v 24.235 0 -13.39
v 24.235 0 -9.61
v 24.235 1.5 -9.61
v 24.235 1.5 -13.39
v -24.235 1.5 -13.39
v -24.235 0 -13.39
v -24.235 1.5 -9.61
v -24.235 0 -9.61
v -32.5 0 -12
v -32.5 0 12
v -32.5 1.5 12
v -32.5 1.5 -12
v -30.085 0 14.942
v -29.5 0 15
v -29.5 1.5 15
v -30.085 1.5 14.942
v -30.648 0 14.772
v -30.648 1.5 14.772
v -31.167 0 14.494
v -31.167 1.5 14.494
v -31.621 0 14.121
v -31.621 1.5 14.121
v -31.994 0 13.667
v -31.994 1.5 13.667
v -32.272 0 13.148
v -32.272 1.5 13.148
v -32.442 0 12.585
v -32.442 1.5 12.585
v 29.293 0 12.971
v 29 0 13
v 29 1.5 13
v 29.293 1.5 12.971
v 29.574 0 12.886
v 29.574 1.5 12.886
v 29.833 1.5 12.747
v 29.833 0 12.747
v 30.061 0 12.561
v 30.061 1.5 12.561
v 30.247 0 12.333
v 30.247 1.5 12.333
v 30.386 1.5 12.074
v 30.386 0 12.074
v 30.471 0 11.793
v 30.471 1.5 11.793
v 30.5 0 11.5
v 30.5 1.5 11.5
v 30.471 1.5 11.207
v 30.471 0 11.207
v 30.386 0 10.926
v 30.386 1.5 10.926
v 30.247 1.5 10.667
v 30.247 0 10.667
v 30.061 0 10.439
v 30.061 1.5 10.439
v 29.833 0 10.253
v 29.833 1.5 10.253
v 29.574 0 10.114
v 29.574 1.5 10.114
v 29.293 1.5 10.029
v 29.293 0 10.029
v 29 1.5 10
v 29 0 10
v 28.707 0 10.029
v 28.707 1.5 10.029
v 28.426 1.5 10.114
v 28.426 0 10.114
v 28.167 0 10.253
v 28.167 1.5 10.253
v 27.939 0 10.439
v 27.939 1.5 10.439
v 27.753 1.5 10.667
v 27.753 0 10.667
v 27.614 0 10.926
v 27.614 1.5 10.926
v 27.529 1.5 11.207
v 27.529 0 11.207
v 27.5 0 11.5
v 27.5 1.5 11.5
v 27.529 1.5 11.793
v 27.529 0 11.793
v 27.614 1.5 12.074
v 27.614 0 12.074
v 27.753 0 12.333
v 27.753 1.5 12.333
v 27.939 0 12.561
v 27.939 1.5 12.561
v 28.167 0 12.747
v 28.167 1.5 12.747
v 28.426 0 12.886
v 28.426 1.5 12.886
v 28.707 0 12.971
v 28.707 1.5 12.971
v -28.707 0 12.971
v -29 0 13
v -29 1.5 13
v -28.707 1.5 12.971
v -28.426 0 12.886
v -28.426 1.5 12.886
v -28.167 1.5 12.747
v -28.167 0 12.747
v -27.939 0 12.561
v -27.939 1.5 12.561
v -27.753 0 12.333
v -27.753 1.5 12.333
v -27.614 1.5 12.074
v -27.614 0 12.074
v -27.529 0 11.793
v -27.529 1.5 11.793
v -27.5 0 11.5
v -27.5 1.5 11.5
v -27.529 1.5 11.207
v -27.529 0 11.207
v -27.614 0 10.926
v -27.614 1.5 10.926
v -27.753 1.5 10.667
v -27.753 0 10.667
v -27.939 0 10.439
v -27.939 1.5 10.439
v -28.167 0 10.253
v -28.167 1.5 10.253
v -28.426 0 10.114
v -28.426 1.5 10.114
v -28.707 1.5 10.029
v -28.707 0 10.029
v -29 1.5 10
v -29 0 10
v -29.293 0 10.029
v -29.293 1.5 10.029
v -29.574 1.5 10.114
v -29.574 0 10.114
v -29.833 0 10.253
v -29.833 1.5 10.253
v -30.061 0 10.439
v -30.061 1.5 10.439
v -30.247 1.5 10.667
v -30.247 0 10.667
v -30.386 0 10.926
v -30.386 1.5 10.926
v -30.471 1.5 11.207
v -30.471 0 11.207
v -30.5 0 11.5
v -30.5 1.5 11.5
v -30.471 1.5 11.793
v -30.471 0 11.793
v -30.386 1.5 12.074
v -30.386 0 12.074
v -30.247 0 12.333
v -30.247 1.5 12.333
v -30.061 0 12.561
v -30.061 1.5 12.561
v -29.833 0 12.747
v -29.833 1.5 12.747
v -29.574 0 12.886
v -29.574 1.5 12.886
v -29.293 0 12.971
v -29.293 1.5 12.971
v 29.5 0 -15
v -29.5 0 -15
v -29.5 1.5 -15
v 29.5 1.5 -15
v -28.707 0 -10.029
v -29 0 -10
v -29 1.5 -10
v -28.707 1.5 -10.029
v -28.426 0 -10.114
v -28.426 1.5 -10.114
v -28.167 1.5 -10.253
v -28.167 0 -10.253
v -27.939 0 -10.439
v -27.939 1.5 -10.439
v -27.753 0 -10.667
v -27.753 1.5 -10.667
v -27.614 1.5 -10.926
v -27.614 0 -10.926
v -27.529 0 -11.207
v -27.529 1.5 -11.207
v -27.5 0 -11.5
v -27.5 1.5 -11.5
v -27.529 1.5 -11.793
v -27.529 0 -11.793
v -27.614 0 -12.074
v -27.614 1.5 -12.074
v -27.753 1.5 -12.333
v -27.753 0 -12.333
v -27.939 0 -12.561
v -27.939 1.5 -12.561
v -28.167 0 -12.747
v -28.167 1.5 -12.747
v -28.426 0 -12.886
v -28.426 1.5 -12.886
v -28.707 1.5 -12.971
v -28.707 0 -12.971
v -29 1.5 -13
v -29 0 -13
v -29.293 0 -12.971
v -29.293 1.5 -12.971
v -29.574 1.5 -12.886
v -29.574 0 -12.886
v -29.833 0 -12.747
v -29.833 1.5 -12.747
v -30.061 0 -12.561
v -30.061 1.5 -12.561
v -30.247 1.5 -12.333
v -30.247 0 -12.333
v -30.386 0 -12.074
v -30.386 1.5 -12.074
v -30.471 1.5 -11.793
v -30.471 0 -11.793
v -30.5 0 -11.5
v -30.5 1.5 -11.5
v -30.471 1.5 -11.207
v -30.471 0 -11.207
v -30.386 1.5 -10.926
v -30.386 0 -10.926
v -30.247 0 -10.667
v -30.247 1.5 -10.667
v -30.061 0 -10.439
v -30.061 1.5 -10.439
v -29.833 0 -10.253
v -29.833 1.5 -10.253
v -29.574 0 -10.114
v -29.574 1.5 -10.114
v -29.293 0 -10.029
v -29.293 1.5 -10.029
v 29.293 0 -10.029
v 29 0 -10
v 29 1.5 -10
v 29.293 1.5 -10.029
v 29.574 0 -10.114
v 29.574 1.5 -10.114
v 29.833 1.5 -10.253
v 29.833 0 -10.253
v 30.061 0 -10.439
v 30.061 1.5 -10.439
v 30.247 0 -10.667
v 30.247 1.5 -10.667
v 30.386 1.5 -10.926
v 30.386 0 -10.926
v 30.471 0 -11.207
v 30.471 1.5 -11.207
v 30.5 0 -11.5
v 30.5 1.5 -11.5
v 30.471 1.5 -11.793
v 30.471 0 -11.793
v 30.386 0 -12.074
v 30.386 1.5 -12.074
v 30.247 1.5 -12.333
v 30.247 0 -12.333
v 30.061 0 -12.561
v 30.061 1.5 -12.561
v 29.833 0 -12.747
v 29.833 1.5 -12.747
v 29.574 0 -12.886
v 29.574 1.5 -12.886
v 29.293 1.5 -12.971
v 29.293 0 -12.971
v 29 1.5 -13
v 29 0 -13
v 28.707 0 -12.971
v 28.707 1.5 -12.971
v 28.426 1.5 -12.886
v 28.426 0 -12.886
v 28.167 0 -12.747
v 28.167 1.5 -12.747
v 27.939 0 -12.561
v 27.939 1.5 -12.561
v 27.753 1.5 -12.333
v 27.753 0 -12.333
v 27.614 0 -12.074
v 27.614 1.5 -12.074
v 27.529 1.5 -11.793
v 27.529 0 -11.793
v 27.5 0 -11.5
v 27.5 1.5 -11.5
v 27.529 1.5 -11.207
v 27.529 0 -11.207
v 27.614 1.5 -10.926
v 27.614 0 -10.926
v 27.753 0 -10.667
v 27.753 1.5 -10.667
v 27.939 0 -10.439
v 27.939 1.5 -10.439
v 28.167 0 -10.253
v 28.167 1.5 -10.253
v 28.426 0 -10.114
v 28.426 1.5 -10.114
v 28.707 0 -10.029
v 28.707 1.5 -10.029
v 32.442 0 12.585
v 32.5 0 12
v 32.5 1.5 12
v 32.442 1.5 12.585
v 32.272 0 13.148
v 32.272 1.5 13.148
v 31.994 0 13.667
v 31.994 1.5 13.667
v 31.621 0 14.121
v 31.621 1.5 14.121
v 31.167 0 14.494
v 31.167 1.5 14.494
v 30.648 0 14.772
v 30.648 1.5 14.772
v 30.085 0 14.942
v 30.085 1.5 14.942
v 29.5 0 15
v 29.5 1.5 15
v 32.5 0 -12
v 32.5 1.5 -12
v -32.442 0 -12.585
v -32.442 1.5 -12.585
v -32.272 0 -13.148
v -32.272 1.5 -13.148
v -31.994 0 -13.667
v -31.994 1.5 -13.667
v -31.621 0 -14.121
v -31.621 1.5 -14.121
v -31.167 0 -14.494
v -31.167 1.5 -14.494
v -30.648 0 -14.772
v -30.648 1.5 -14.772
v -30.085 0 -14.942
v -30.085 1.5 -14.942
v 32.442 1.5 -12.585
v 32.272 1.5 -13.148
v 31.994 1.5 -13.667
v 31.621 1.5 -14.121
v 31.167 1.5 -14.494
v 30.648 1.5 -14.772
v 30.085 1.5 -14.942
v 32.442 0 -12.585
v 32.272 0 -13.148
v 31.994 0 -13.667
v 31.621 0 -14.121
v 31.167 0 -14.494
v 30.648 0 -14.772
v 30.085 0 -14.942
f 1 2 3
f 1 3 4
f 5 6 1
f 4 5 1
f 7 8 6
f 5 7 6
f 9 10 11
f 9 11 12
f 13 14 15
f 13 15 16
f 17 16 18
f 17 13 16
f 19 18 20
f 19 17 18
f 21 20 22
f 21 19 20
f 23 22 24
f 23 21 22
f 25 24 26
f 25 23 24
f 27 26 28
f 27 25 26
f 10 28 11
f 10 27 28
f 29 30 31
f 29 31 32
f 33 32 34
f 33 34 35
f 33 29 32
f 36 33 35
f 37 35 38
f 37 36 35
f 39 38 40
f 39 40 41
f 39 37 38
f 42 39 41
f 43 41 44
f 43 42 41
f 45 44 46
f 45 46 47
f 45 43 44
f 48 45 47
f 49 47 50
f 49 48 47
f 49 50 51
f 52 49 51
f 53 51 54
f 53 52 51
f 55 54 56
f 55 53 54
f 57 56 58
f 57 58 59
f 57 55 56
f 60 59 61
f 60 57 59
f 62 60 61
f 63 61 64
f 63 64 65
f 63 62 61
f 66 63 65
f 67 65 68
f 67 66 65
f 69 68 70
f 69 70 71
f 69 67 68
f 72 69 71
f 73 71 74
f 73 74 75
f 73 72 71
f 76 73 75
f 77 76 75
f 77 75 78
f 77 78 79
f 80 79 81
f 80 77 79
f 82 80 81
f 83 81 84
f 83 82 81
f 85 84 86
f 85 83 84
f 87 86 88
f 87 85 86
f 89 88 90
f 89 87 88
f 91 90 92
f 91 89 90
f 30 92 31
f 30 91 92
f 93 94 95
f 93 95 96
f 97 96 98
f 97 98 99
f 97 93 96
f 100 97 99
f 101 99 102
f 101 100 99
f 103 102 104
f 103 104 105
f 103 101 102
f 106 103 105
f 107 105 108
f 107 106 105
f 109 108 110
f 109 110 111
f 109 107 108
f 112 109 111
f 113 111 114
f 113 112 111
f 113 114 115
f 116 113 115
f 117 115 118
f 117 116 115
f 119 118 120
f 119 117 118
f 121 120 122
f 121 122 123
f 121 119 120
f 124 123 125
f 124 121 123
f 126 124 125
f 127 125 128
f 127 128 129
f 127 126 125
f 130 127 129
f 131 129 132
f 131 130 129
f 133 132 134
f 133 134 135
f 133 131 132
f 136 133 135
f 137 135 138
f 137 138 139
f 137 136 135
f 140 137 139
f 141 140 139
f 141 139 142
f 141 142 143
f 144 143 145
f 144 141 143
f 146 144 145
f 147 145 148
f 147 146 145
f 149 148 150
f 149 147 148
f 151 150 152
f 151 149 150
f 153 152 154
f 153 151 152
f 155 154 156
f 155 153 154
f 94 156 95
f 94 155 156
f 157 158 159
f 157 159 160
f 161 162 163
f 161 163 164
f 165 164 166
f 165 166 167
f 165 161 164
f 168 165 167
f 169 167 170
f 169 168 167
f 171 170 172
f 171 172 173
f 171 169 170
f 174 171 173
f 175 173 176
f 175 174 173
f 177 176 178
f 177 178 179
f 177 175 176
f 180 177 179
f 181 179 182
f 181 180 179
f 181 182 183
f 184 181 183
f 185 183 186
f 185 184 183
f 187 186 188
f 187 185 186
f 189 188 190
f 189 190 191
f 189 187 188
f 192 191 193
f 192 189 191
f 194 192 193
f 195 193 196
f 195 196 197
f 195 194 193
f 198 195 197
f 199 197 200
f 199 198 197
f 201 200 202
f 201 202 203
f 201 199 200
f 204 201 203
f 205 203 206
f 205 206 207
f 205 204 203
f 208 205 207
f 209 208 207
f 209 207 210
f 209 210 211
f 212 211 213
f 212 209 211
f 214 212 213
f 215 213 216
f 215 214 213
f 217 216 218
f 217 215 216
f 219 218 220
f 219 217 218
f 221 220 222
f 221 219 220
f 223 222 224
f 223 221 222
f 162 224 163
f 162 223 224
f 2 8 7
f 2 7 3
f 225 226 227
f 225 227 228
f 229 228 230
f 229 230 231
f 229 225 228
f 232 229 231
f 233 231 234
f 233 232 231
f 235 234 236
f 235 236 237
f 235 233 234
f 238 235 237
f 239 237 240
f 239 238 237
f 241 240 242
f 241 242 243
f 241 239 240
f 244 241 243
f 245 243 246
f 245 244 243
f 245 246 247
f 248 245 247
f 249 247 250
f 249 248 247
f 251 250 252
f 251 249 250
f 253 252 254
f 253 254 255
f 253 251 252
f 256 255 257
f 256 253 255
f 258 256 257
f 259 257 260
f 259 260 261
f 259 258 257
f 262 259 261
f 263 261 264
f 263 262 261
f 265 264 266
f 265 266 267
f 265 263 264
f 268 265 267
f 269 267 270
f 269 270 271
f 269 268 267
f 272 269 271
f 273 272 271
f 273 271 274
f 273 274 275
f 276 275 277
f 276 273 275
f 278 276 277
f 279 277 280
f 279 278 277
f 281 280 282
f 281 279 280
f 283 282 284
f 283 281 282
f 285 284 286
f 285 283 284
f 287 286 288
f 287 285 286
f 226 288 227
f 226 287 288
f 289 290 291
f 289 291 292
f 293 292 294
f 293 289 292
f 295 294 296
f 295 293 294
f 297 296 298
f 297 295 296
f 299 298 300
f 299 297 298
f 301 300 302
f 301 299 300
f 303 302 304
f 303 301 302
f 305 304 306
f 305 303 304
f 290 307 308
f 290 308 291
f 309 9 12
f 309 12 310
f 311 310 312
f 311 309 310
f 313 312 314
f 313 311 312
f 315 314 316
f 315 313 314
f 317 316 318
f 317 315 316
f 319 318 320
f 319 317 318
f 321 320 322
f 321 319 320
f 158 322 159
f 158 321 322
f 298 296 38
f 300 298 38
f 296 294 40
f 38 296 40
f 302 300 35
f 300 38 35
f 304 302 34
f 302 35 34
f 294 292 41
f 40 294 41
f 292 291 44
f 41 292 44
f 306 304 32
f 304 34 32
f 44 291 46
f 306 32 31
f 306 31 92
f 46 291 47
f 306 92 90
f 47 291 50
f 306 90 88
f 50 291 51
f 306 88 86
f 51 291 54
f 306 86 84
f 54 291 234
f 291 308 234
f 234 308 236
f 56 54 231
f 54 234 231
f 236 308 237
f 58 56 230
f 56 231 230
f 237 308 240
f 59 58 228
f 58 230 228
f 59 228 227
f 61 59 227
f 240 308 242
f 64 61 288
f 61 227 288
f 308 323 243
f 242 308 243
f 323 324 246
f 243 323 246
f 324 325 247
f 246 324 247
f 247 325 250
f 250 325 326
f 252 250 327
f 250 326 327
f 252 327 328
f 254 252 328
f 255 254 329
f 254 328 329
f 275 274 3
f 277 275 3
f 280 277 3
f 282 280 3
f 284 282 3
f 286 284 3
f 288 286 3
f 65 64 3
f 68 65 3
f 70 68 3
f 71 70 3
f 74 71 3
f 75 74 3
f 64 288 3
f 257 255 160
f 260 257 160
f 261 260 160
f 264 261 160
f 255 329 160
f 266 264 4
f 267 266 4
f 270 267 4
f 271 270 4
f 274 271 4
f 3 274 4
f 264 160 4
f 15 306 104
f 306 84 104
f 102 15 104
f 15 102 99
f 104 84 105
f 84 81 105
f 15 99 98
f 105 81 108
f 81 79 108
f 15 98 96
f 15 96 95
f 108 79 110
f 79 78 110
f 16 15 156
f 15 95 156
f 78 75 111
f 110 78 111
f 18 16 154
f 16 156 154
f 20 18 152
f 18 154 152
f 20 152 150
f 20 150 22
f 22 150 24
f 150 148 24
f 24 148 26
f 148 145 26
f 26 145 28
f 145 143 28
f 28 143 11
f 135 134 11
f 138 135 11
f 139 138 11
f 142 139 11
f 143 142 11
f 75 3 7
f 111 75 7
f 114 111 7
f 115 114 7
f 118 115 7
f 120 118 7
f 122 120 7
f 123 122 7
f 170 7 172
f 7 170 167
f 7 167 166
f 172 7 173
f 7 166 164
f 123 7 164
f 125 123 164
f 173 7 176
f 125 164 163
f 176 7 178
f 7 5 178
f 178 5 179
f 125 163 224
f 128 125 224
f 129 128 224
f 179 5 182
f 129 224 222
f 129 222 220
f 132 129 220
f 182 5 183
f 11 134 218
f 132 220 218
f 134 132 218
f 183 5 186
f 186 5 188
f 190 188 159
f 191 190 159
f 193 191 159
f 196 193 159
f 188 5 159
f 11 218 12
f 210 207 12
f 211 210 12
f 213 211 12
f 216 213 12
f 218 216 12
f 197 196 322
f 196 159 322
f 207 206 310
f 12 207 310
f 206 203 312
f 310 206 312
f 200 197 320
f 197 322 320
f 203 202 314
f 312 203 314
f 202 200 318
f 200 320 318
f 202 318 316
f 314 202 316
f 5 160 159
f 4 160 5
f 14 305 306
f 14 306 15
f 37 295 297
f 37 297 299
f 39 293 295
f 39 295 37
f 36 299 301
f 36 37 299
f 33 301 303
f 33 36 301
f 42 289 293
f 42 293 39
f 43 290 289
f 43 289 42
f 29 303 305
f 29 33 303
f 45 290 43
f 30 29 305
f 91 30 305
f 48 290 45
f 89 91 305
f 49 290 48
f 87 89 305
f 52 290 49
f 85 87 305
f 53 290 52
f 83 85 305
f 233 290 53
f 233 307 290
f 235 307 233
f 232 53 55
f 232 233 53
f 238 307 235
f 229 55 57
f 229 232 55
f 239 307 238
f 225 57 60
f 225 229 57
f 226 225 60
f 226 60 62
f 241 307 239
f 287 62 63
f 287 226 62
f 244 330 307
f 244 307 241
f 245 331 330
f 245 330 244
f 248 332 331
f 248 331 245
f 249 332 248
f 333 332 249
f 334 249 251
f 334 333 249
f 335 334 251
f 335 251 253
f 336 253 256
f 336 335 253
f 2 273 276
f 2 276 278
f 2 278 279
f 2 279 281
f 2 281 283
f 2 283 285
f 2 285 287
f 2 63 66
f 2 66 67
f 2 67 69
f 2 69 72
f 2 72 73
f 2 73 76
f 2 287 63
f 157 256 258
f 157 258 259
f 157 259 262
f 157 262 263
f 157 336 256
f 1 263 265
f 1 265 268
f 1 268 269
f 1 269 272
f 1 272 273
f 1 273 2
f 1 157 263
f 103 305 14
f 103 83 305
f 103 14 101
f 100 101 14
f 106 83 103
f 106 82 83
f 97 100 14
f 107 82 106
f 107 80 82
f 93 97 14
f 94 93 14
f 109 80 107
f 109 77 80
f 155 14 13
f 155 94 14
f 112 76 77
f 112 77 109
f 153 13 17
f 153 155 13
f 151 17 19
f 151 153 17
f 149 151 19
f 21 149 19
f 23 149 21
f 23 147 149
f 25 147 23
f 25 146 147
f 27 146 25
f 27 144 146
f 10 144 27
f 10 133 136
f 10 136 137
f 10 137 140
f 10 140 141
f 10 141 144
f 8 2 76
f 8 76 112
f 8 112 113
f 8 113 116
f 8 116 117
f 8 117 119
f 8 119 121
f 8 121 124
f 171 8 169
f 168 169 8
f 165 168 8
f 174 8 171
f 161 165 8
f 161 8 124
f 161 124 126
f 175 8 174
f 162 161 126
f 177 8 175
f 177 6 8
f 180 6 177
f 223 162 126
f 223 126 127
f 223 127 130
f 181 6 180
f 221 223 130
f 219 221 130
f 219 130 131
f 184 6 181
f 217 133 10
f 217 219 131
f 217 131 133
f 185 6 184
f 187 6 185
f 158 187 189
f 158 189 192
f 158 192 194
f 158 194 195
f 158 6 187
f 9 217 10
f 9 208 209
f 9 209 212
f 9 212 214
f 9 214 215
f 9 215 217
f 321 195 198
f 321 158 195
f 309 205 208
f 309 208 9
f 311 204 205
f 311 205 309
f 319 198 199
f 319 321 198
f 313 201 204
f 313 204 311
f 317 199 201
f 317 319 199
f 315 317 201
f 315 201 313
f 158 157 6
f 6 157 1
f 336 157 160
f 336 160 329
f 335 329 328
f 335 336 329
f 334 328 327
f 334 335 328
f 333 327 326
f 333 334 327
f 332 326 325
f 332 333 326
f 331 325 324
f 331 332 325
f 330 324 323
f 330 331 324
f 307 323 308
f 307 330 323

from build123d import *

# Parameters (mm, degrees)
SKETCH1_R           = 1.5
SKETCH1_W           = 48.470262398
SKETCH1_H           = 3.779033876
BOSS_EXTRUDE1_DEPTH = 1.5


with BuildPart() as part:
    # Sketch1 → Boss-Extrude1 (new body)
    with BuildSketch(Plane(origin=(0, 0, 0), x_dir=(1, 0, 0), z_dir=(0, 1, 0))):
        with BuildLine():
            Line((29.5, -15), (-29.5, -15))
            ThreePointArc((-29.5, -15), (-31.621320344, -14.121320344), (-32.5, -12))
            Line((-32.5, -12), (-32.5, 12))
            ThreePointArc((-32.5, 12), (-31.621320344, 14.121320344), (-29.5, 15))
            Line((-29.5, 15), (29.5, 15))
            ThreePointArc((29.5, 15), (31.621320344, 14.121320344), (32.5, 12))
            Line((32.5, 12), (32.5, -12))
            ThreePointArc((32.5, -12), (31.621320344, -14.121320344), (29.5, -15))
        make_face()
        with Locations(Location((-29, 11.5, 0), (0, 0, 270))):
            Circle(SKETCH1_R, mode=Mode.SUBTRACT)
        with Locations(Location((29, 11.5, 0), (0, 0, 270))):
            Circle(SKETCH1_R, mode=Mode.SUBTRACT)
        with Locations(Location((29, -11.5, 0), (0, 0, 270))):
            Circle(SKETCH1_R, mode=Mode.SUBTRACT)
        with Locations(Location((-29, -11.5, 0), (0, 0, 270))):
            Circle(SKETCH1_R, mode=Mode.SUBTRACT)
        with Locations((0, 11.5)):
            Rectangle(SKETCH1_W, SKETCH1_H, mode=Mode.SUBTRACT)
    extrude(amount=BOSS_EXTRUDE1_DEPTH)


solid = part.part
